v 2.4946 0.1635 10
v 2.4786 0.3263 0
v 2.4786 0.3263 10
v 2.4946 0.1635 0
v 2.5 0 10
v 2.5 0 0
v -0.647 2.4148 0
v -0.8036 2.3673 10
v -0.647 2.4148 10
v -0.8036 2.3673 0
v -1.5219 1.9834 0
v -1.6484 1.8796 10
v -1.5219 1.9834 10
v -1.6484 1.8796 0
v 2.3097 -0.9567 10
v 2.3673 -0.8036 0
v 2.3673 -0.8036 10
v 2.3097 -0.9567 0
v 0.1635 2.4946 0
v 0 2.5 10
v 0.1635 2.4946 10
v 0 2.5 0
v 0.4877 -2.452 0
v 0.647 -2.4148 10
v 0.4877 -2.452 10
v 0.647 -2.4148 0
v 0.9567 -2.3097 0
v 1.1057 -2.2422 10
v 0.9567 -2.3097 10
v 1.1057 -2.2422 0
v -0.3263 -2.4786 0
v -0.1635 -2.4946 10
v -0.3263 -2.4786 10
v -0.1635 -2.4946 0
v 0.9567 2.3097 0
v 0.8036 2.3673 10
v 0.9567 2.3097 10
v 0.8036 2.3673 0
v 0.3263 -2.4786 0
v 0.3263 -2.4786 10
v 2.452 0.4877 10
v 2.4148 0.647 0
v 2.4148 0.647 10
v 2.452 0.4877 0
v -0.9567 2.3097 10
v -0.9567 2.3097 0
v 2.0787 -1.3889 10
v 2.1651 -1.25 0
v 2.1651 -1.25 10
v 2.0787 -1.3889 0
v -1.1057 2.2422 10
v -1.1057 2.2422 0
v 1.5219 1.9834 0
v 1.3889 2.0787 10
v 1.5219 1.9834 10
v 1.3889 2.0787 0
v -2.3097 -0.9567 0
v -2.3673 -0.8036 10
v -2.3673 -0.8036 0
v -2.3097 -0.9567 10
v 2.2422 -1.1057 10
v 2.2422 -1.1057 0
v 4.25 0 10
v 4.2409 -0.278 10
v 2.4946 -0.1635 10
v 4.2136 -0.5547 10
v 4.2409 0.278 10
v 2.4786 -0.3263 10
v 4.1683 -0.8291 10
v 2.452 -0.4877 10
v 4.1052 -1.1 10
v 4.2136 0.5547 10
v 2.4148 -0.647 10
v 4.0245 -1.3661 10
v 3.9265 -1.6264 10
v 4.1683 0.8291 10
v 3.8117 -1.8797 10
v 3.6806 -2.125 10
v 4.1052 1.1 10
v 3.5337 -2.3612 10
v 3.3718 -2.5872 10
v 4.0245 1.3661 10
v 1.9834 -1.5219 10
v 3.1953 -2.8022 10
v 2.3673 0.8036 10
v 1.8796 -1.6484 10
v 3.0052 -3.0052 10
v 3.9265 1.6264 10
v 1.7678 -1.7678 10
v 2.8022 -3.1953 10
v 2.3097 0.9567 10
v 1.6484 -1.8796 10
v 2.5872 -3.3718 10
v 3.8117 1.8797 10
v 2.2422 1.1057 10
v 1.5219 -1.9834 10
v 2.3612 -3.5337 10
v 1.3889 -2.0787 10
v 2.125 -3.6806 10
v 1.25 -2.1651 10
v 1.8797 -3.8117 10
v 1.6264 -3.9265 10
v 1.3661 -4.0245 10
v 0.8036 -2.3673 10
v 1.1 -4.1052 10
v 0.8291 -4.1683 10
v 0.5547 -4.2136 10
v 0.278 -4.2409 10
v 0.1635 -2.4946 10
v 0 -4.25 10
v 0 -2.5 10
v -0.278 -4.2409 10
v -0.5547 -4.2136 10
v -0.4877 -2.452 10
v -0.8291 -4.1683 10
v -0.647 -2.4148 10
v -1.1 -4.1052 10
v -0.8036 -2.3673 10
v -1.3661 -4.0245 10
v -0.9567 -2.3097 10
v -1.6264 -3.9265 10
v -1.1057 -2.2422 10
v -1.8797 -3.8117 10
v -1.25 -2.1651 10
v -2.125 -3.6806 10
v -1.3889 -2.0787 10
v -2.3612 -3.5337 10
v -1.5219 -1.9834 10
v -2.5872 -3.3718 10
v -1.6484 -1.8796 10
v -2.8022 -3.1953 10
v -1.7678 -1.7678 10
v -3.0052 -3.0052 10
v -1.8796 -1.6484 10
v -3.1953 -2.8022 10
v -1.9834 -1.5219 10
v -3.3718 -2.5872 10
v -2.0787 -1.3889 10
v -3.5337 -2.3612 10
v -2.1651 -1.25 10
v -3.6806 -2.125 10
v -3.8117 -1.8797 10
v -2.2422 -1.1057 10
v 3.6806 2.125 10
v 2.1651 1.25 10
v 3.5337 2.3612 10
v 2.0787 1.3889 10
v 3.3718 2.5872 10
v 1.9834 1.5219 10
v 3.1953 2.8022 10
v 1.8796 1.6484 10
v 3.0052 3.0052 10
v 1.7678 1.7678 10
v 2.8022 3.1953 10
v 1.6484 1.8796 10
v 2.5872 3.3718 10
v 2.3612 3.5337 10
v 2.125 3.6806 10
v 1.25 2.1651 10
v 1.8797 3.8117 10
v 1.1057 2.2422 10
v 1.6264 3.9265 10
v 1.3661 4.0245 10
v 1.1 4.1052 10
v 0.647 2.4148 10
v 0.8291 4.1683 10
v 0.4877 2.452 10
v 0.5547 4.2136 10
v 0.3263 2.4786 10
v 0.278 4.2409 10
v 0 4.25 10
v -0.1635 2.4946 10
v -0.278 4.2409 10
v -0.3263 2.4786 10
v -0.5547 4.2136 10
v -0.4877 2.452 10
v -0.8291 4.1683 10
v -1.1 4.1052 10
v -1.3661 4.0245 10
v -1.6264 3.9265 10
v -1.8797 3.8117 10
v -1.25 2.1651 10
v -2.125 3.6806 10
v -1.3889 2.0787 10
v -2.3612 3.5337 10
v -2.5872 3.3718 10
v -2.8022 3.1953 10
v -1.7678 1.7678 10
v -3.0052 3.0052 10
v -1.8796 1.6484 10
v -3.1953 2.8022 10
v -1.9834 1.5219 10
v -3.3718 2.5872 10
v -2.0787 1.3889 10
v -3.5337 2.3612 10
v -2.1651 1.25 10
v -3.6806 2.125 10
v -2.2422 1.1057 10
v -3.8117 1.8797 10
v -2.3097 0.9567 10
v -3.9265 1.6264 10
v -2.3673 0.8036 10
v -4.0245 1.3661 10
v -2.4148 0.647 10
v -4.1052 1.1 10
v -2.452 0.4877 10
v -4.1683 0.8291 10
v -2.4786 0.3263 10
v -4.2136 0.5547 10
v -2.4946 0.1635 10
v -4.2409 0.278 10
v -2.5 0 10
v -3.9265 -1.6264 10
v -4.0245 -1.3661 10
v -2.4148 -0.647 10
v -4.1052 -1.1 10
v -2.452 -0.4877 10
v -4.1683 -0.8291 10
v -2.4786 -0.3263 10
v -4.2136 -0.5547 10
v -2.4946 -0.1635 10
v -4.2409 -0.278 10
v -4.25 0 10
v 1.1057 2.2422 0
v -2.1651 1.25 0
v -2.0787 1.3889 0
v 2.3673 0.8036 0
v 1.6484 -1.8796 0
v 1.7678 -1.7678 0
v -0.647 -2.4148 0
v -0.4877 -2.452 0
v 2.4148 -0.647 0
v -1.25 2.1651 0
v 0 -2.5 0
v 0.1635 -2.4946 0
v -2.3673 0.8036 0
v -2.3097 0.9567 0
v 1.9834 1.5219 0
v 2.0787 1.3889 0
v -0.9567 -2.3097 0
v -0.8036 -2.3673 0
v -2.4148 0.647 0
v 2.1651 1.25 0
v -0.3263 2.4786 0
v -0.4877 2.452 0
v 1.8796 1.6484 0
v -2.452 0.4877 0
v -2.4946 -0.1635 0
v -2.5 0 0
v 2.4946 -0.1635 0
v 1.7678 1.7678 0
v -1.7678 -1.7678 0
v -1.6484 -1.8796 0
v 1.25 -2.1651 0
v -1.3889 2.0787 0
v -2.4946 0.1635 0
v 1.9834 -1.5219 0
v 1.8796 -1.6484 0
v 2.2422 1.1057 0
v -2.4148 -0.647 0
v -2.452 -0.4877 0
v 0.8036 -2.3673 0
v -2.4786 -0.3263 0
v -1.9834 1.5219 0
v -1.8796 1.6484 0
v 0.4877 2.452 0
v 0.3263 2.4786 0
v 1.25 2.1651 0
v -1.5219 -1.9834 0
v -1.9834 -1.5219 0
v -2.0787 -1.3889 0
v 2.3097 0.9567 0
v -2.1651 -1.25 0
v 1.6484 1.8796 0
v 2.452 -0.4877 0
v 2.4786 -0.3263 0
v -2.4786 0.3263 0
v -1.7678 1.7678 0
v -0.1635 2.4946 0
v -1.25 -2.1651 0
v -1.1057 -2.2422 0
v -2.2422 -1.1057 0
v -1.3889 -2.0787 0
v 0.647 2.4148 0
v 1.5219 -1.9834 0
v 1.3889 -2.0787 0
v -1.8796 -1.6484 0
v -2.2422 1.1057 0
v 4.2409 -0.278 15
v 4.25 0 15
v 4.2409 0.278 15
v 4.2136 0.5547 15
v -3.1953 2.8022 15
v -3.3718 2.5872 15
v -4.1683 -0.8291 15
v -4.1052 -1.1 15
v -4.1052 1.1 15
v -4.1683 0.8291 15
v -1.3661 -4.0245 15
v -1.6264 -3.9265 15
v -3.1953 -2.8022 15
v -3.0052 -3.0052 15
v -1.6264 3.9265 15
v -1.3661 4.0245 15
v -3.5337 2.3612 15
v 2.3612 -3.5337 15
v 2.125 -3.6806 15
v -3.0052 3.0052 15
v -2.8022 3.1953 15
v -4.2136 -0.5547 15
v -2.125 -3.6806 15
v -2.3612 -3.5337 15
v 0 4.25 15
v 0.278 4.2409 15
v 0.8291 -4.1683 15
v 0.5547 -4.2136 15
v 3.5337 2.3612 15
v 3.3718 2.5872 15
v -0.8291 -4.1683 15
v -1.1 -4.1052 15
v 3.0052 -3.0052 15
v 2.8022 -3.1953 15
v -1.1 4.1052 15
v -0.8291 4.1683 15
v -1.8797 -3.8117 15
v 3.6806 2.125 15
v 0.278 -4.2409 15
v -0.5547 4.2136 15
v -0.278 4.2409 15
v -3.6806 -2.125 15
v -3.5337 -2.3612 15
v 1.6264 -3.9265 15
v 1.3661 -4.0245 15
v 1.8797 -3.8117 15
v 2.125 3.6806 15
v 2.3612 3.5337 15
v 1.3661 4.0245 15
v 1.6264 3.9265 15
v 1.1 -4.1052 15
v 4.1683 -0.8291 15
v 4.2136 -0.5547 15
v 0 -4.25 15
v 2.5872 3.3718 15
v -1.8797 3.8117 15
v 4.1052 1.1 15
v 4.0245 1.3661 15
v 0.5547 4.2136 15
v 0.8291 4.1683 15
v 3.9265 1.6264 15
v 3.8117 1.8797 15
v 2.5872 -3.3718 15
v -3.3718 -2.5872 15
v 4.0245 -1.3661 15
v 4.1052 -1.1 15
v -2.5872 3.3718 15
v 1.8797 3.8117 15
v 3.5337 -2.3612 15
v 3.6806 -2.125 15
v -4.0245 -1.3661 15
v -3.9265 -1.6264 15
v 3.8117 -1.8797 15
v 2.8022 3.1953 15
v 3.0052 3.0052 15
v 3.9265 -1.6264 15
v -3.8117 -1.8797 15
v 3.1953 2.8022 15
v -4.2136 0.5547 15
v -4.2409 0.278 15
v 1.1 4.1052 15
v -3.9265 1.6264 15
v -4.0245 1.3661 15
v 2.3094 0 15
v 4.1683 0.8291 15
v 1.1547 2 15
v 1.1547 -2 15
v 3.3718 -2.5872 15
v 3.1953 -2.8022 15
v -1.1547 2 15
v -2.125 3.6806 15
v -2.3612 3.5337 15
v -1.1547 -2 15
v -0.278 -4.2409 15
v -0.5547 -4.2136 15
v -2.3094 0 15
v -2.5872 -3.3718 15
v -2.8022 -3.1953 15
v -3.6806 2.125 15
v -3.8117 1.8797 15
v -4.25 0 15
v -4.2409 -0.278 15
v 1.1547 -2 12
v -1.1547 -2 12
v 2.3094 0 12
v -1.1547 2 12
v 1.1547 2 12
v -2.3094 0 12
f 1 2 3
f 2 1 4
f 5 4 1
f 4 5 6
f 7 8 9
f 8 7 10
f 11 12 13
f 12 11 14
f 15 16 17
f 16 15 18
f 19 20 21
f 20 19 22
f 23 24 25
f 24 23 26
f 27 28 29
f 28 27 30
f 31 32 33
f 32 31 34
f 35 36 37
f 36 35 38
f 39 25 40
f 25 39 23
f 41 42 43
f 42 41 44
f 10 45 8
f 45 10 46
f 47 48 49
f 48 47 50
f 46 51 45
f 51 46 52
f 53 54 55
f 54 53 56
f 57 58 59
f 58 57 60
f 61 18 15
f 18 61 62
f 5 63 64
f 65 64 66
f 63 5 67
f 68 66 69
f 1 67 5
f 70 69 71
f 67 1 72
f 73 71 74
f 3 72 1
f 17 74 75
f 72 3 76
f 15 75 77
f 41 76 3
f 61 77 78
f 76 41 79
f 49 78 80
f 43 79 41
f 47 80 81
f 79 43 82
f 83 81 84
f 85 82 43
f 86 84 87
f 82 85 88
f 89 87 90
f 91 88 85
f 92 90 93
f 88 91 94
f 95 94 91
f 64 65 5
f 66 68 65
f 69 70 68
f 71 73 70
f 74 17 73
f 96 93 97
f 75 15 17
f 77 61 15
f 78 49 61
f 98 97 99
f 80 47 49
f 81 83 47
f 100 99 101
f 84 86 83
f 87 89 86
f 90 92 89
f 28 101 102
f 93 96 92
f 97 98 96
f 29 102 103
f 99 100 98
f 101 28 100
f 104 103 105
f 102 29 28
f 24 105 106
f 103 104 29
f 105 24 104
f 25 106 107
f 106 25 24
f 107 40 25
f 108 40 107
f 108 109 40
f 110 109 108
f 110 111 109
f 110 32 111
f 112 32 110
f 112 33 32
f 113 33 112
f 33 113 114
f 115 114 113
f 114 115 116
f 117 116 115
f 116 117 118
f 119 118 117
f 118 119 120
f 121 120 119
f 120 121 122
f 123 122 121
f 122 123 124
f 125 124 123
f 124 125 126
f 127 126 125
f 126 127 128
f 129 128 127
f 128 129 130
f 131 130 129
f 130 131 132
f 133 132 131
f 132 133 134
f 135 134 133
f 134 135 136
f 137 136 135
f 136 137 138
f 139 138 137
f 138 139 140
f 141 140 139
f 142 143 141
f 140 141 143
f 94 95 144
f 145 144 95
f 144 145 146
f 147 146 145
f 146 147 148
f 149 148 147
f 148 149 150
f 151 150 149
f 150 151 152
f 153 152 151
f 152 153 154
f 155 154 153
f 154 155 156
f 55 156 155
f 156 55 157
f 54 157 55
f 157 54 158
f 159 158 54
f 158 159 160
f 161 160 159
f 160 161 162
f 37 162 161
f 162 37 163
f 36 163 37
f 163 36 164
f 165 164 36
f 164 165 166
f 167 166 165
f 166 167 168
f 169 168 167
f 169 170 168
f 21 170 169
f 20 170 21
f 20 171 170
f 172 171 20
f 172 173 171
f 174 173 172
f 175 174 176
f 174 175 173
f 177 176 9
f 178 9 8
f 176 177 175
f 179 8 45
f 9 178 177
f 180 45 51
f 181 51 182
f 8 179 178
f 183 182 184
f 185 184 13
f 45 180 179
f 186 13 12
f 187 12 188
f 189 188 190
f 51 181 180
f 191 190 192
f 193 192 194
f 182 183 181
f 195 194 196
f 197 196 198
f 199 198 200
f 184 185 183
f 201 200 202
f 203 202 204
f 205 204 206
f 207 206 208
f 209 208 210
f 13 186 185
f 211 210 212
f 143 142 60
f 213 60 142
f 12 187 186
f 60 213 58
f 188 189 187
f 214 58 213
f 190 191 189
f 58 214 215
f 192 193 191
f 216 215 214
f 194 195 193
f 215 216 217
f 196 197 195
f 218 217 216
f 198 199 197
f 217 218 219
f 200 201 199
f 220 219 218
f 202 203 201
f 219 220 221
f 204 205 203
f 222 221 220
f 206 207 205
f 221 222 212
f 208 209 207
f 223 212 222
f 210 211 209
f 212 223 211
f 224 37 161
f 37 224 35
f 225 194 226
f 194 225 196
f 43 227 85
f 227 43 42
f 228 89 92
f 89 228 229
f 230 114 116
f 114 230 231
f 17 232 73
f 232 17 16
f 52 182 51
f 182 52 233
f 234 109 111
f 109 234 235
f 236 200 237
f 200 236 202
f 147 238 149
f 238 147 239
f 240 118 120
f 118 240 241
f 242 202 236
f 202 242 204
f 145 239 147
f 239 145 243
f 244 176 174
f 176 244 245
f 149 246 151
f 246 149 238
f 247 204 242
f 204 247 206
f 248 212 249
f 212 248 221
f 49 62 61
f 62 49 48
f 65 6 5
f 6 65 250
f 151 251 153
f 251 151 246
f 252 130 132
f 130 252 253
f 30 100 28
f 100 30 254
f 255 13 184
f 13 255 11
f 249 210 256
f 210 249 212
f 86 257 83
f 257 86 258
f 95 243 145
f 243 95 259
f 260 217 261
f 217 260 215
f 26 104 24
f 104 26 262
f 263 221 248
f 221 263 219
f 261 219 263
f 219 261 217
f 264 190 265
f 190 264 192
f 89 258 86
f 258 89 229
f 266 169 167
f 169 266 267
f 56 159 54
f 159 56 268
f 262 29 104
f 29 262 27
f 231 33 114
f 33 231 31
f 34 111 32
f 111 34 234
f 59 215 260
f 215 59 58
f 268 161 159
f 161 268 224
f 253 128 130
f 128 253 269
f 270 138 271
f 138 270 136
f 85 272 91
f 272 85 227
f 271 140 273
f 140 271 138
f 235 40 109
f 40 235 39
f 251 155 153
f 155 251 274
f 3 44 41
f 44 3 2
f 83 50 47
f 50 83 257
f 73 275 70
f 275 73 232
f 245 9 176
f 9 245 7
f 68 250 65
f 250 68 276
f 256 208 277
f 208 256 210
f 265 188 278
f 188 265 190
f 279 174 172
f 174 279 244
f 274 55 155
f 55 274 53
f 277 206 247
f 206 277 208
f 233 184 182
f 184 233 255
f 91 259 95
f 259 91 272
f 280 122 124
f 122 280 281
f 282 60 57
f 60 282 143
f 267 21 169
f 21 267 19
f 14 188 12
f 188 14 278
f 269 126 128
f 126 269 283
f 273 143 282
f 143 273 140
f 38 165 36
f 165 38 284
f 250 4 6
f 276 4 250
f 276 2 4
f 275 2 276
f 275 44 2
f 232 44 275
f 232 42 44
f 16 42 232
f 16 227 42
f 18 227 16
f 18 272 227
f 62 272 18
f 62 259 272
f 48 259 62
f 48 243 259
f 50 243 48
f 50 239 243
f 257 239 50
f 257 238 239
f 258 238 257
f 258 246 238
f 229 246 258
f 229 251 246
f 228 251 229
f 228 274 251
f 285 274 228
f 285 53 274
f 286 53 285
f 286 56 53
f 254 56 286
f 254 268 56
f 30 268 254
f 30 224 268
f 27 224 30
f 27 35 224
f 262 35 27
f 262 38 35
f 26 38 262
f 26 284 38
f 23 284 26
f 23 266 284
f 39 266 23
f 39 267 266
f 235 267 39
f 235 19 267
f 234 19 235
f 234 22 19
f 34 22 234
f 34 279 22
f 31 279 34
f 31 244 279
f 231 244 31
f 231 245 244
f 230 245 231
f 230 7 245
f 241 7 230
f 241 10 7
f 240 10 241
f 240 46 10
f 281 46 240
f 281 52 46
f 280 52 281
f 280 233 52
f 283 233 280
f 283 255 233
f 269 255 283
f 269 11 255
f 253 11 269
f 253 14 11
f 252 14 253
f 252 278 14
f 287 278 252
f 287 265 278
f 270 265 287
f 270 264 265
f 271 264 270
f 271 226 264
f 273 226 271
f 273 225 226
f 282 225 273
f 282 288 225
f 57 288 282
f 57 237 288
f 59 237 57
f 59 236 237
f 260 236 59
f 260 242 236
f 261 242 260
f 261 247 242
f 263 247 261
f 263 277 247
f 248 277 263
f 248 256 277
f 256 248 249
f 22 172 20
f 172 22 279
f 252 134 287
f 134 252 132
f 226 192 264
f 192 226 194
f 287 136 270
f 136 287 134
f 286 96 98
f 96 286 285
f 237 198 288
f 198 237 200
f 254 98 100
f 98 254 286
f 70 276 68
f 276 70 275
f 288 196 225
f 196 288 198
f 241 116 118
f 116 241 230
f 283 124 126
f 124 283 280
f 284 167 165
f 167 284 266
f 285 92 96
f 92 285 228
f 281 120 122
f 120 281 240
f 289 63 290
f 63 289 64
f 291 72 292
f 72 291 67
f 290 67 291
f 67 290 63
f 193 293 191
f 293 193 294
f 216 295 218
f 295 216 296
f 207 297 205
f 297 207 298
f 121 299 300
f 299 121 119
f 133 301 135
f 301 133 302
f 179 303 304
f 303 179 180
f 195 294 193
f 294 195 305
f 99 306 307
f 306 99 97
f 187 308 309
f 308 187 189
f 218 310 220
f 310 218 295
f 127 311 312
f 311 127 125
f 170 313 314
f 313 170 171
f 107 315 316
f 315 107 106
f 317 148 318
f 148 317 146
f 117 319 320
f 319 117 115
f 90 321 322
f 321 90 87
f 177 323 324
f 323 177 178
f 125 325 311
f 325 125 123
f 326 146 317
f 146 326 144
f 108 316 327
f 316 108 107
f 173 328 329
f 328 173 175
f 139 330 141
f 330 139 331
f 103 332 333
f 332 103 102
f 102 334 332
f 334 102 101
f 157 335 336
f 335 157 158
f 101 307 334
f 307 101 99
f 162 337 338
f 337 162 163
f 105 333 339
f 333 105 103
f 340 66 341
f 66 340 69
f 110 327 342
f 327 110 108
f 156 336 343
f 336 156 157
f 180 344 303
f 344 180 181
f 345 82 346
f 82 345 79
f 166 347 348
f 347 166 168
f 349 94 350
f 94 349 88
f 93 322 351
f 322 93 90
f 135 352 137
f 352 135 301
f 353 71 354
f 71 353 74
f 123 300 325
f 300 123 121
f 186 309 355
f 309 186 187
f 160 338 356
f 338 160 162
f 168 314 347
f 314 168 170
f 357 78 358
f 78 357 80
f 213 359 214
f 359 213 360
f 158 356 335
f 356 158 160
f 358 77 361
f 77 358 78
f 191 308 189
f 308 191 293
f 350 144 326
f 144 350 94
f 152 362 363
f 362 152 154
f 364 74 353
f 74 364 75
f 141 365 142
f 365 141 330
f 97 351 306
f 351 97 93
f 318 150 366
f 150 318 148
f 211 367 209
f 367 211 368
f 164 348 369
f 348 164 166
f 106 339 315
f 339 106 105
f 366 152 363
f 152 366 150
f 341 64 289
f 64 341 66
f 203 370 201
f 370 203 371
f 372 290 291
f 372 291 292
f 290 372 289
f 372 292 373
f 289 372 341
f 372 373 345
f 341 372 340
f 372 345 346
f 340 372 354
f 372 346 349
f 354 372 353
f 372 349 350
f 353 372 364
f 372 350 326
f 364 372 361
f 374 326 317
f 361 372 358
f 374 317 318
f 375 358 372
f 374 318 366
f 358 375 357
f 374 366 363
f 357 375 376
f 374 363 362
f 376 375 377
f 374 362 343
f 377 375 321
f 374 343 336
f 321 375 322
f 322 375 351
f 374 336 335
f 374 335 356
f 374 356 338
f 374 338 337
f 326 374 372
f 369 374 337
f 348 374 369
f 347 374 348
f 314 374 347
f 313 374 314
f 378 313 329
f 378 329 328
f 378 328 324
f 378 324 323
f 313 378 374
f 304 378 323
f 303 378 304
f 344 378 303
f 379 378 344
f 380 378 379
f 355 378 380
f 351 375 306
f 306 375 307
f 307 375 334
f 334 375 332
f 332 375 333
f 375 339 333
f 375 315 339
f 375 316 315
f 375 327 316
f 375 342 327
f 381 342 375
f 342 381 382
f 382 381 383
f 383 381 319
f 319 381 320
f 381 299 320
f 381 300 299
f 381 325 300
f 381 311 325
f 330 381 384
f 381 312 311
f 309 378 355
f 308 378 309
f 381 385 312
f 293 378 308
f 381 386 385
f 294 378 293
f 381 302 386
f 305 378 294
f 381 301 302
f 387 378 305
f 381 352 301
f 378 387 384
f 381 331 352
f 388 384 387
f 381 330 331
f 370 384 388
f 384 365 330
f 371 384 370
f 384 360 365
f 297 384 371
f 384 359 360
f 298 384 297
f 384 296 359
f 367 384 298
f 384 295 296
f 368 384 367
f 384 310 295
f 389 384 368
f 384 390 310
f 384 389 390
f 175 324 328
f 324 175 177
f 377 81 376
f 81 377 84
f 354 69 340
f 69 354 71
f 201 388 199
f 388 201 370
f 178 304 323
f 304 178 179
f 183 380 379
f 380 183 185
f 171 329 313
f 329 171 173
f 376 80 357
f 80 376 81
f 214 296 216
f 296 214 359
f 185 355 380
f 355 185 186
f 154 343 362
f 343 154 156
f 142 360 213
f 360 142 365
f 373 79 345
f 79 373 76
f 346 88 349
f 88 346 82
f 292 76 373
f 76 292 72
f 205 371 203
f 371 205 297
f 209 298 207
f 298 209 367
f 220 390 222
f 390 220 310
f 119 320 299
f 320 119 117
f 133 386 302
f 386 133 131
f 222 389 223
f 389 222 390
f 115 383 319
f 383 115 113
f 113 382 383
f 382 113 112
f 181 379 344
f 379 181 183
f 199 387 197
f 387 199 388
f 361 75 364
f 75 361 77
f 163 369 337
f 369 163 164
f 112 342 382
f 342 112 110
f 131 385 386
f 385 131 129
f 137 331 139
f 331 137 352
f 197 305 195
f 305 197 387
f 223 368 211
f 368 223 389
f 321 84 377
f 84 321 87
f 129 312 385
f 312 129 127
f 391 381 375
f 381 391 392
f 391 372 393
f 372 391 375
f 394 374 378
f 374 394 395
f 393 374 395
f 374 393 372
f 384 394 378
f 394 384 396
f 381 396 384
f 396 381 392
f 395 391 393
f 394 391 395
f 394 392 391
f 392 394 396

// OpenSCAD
$fn = 96;

d_shaft = 5.0;
L = 10.0;

d_head = 8.5;
h_head = 5.0;

// Approximate hex socket for M5 socket head cap screw
socket_af = 4.0;          // across flats
socket_depth = 3.0;       // depth
socket_corner_r = socket_af / sqrt(3); // circumradius for hex

module hex_prism(r, h) {
    cylinder(r=r, h=h, $fn=6);
}

module socket_head_cap_screw() {
    difference() {
        union() {
            // Shaft
            cylinder(d=d_shaft, h=L);

            // Head
            translate([0,0,L])
                cylinder(d=d_head, h=h_head);
        }

        // Hex socket cut
        translate([0,0,L + h_head - socket_depth])
            hex_prism(socket_corner_r, socket_depth + 0.2);
    }
}

socket_head_cap_screw();
